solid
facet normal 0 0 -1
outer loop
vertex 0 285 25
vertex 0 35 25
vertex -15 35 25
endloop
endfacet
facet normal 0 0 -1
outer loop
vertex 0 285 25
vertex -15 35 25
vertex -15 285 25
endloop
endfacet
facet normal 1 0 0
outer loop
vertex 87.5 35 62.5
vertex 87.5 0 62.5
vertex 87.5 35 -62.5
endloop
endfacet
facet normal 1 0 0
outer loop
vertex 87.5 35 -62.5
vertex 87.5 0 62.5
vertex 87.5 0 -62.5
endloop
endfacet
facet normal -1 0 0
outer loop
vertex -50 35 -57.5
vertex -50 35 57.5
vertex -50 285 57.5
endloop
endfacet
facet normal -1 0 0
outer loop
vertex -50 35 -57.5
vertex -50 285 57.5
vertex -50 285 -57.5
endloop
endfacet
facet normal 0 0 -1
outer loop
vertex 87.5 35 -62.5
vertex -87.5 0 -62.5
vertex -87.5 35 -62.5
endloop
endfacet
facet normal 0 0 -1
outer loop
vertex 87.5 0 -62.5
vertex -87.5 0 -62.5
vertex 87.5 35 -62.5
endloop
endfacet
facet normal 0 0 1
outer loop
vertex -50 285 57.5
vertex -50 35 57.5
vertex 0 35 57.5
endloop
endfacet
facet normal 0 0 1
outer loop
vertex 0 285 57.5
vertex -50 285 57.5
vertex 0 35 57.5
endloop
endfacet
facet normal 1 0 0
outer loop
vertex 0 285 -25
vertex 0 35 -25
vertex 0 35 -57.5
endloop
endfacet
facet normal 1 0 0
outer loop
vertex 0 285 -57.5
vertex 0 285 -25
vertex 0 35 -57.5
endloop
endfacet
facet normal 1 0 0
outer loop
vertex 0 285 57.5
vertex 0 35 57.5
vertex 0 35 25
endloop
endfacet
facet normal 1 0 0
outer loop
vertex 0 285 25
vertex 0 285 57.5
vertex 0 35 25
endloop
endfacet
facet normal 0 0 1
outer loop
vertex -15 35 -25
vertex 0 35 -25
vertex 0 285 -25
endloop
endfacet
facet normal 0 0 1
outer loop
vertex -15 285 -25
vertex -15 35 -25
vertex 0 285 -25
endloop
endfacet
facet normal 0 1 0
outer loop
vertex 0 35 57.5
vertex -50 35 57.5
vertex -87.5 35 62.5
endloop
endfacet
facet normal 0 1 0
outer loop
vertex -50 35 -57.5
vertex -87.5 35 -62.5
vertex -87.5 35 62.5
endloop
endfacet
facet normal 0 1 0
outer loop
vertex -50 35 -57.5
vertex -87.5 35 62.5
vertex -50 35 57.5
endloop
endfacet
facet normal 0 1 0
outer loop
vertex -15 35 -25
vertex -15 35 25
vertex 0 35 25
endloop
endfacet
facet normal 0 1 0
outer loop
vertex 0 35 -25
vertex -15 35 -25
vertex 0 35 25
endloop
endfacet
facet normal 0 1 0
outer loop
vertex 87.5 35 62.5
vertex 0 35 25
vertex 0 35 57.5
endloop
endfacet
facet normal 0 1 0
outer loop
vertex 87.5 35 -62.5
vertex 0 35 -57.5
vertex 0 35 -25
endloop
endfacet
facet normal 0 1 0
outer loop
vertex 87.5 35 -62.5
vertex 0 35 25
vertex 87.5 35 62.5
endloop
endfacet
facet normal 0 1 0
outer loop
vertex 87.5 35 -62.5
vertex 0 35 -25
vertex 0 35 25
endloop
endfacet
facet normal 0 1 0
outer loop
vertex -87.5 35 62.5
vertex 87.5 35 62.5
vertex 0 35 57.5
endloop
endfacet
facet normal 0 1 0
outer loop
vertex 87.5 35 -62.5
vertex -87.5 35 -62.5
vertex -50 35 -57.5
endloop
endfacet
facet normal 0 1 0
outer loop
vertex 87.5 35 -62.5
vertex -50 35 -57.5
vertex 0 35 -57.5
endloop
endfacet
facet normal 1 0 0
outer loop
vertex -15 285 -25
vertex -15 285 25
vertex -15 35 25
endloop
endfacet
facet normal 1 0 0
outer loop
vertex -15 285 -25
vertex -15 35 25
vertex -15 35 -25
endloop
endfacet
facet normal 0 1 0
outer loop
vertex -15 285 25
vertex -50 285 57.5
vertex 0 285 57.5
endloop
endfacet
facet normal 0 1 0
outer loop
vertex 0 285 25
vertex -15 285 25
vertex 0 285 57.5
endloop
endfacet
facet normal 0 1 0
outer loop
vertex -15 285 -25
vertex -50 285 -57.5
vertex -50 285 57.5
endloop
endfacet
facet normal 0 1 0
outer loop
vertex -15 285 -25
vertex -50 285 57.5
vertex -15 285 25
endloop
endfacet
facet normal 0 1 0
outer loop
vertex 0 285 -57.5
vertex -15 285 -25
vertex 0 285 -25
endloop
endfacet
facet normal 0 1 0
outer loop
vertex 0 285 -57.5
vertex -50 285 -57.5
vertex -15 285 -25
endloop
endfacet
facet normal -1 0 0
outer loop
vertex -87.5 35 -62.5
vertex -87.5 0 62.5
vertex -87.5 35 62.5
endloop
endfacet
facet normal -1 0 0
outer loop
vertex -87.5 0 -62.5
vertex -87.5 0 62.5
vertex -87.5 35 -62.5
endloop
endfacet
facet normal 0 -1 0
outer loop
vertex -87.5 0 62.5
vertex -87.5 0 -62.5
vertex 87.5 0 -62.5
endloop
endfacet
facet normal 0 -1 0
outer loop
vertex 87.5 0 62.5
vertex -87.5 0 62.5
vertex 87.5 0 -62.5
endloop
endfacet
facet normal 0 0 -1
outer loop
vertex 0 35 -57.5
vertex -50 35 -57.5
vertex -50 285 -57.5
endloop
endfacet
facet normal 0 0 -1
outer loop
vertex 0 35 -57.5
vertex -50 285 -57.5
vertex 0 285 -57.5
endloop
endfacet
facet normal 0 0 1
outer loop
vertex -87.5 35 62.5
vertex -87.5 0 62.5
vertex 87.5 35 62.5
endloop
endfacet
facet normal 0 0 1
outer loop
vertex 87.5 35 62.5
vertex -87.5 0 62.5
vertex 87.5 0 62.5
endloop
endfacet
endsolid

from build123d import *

# Parameters (mm, degrees)
CROQUIS1_W              = 175
CROQUIS1_H              = 125
SALIENTE_EXTRUIR1_DEPTH = 35
CROQUIS2_W              = 50
CROQUIS2_H              = 115
SALIENTE_EXTRUIR2_DEPTH = 250
CROQUIS3_W              = 50
CROQUIS3_H              = 250
CORTAR_EXTRUIR1_DEPTH   = 15


with BuildPart() as part:
    # Croquis1 → Saliente-Extruir1 (new body)
    with BuildSketch(Plane(origin=(0, 0, 0), x_dir=(1, 0, 0), z_dir=(0, 1, 0))):
        Rectangle(CROQUIS1_W, CROQUIS1_H)
    extrude(amount=SALIENTE_EXTRUIR1_DEPTH)

    # Croquis2 → Saliente-Extruir2 (add)
    with BuildSketch(Plane(origin=(0, 35, 0), x_dir=(1, 0, 0), z_dir=(0, 1, 0))):
        with Locations((-25, 0)):
            Rectangle(CROQUIS2_W, CROQUIS2_H)
    extrude(amount=SALIENTE_EXTRUIR2_DEPTH)

    # Croquis3 → Cortar-Extruir1 (cut)
    with BuildSketch(Plane(origin=(0, 0, 0), x_dir=(0, 0, -1), z_dir=(1, 0, 0))):
        with Locations((0, 160)):
            Rectangle(CROQUIS3_W, CROQUIS3_H)
    extrude(amount=-CORTAR_EXTRUIR1_DEPTH, mode=Mode.SUBTRACT)


solid = part.part
